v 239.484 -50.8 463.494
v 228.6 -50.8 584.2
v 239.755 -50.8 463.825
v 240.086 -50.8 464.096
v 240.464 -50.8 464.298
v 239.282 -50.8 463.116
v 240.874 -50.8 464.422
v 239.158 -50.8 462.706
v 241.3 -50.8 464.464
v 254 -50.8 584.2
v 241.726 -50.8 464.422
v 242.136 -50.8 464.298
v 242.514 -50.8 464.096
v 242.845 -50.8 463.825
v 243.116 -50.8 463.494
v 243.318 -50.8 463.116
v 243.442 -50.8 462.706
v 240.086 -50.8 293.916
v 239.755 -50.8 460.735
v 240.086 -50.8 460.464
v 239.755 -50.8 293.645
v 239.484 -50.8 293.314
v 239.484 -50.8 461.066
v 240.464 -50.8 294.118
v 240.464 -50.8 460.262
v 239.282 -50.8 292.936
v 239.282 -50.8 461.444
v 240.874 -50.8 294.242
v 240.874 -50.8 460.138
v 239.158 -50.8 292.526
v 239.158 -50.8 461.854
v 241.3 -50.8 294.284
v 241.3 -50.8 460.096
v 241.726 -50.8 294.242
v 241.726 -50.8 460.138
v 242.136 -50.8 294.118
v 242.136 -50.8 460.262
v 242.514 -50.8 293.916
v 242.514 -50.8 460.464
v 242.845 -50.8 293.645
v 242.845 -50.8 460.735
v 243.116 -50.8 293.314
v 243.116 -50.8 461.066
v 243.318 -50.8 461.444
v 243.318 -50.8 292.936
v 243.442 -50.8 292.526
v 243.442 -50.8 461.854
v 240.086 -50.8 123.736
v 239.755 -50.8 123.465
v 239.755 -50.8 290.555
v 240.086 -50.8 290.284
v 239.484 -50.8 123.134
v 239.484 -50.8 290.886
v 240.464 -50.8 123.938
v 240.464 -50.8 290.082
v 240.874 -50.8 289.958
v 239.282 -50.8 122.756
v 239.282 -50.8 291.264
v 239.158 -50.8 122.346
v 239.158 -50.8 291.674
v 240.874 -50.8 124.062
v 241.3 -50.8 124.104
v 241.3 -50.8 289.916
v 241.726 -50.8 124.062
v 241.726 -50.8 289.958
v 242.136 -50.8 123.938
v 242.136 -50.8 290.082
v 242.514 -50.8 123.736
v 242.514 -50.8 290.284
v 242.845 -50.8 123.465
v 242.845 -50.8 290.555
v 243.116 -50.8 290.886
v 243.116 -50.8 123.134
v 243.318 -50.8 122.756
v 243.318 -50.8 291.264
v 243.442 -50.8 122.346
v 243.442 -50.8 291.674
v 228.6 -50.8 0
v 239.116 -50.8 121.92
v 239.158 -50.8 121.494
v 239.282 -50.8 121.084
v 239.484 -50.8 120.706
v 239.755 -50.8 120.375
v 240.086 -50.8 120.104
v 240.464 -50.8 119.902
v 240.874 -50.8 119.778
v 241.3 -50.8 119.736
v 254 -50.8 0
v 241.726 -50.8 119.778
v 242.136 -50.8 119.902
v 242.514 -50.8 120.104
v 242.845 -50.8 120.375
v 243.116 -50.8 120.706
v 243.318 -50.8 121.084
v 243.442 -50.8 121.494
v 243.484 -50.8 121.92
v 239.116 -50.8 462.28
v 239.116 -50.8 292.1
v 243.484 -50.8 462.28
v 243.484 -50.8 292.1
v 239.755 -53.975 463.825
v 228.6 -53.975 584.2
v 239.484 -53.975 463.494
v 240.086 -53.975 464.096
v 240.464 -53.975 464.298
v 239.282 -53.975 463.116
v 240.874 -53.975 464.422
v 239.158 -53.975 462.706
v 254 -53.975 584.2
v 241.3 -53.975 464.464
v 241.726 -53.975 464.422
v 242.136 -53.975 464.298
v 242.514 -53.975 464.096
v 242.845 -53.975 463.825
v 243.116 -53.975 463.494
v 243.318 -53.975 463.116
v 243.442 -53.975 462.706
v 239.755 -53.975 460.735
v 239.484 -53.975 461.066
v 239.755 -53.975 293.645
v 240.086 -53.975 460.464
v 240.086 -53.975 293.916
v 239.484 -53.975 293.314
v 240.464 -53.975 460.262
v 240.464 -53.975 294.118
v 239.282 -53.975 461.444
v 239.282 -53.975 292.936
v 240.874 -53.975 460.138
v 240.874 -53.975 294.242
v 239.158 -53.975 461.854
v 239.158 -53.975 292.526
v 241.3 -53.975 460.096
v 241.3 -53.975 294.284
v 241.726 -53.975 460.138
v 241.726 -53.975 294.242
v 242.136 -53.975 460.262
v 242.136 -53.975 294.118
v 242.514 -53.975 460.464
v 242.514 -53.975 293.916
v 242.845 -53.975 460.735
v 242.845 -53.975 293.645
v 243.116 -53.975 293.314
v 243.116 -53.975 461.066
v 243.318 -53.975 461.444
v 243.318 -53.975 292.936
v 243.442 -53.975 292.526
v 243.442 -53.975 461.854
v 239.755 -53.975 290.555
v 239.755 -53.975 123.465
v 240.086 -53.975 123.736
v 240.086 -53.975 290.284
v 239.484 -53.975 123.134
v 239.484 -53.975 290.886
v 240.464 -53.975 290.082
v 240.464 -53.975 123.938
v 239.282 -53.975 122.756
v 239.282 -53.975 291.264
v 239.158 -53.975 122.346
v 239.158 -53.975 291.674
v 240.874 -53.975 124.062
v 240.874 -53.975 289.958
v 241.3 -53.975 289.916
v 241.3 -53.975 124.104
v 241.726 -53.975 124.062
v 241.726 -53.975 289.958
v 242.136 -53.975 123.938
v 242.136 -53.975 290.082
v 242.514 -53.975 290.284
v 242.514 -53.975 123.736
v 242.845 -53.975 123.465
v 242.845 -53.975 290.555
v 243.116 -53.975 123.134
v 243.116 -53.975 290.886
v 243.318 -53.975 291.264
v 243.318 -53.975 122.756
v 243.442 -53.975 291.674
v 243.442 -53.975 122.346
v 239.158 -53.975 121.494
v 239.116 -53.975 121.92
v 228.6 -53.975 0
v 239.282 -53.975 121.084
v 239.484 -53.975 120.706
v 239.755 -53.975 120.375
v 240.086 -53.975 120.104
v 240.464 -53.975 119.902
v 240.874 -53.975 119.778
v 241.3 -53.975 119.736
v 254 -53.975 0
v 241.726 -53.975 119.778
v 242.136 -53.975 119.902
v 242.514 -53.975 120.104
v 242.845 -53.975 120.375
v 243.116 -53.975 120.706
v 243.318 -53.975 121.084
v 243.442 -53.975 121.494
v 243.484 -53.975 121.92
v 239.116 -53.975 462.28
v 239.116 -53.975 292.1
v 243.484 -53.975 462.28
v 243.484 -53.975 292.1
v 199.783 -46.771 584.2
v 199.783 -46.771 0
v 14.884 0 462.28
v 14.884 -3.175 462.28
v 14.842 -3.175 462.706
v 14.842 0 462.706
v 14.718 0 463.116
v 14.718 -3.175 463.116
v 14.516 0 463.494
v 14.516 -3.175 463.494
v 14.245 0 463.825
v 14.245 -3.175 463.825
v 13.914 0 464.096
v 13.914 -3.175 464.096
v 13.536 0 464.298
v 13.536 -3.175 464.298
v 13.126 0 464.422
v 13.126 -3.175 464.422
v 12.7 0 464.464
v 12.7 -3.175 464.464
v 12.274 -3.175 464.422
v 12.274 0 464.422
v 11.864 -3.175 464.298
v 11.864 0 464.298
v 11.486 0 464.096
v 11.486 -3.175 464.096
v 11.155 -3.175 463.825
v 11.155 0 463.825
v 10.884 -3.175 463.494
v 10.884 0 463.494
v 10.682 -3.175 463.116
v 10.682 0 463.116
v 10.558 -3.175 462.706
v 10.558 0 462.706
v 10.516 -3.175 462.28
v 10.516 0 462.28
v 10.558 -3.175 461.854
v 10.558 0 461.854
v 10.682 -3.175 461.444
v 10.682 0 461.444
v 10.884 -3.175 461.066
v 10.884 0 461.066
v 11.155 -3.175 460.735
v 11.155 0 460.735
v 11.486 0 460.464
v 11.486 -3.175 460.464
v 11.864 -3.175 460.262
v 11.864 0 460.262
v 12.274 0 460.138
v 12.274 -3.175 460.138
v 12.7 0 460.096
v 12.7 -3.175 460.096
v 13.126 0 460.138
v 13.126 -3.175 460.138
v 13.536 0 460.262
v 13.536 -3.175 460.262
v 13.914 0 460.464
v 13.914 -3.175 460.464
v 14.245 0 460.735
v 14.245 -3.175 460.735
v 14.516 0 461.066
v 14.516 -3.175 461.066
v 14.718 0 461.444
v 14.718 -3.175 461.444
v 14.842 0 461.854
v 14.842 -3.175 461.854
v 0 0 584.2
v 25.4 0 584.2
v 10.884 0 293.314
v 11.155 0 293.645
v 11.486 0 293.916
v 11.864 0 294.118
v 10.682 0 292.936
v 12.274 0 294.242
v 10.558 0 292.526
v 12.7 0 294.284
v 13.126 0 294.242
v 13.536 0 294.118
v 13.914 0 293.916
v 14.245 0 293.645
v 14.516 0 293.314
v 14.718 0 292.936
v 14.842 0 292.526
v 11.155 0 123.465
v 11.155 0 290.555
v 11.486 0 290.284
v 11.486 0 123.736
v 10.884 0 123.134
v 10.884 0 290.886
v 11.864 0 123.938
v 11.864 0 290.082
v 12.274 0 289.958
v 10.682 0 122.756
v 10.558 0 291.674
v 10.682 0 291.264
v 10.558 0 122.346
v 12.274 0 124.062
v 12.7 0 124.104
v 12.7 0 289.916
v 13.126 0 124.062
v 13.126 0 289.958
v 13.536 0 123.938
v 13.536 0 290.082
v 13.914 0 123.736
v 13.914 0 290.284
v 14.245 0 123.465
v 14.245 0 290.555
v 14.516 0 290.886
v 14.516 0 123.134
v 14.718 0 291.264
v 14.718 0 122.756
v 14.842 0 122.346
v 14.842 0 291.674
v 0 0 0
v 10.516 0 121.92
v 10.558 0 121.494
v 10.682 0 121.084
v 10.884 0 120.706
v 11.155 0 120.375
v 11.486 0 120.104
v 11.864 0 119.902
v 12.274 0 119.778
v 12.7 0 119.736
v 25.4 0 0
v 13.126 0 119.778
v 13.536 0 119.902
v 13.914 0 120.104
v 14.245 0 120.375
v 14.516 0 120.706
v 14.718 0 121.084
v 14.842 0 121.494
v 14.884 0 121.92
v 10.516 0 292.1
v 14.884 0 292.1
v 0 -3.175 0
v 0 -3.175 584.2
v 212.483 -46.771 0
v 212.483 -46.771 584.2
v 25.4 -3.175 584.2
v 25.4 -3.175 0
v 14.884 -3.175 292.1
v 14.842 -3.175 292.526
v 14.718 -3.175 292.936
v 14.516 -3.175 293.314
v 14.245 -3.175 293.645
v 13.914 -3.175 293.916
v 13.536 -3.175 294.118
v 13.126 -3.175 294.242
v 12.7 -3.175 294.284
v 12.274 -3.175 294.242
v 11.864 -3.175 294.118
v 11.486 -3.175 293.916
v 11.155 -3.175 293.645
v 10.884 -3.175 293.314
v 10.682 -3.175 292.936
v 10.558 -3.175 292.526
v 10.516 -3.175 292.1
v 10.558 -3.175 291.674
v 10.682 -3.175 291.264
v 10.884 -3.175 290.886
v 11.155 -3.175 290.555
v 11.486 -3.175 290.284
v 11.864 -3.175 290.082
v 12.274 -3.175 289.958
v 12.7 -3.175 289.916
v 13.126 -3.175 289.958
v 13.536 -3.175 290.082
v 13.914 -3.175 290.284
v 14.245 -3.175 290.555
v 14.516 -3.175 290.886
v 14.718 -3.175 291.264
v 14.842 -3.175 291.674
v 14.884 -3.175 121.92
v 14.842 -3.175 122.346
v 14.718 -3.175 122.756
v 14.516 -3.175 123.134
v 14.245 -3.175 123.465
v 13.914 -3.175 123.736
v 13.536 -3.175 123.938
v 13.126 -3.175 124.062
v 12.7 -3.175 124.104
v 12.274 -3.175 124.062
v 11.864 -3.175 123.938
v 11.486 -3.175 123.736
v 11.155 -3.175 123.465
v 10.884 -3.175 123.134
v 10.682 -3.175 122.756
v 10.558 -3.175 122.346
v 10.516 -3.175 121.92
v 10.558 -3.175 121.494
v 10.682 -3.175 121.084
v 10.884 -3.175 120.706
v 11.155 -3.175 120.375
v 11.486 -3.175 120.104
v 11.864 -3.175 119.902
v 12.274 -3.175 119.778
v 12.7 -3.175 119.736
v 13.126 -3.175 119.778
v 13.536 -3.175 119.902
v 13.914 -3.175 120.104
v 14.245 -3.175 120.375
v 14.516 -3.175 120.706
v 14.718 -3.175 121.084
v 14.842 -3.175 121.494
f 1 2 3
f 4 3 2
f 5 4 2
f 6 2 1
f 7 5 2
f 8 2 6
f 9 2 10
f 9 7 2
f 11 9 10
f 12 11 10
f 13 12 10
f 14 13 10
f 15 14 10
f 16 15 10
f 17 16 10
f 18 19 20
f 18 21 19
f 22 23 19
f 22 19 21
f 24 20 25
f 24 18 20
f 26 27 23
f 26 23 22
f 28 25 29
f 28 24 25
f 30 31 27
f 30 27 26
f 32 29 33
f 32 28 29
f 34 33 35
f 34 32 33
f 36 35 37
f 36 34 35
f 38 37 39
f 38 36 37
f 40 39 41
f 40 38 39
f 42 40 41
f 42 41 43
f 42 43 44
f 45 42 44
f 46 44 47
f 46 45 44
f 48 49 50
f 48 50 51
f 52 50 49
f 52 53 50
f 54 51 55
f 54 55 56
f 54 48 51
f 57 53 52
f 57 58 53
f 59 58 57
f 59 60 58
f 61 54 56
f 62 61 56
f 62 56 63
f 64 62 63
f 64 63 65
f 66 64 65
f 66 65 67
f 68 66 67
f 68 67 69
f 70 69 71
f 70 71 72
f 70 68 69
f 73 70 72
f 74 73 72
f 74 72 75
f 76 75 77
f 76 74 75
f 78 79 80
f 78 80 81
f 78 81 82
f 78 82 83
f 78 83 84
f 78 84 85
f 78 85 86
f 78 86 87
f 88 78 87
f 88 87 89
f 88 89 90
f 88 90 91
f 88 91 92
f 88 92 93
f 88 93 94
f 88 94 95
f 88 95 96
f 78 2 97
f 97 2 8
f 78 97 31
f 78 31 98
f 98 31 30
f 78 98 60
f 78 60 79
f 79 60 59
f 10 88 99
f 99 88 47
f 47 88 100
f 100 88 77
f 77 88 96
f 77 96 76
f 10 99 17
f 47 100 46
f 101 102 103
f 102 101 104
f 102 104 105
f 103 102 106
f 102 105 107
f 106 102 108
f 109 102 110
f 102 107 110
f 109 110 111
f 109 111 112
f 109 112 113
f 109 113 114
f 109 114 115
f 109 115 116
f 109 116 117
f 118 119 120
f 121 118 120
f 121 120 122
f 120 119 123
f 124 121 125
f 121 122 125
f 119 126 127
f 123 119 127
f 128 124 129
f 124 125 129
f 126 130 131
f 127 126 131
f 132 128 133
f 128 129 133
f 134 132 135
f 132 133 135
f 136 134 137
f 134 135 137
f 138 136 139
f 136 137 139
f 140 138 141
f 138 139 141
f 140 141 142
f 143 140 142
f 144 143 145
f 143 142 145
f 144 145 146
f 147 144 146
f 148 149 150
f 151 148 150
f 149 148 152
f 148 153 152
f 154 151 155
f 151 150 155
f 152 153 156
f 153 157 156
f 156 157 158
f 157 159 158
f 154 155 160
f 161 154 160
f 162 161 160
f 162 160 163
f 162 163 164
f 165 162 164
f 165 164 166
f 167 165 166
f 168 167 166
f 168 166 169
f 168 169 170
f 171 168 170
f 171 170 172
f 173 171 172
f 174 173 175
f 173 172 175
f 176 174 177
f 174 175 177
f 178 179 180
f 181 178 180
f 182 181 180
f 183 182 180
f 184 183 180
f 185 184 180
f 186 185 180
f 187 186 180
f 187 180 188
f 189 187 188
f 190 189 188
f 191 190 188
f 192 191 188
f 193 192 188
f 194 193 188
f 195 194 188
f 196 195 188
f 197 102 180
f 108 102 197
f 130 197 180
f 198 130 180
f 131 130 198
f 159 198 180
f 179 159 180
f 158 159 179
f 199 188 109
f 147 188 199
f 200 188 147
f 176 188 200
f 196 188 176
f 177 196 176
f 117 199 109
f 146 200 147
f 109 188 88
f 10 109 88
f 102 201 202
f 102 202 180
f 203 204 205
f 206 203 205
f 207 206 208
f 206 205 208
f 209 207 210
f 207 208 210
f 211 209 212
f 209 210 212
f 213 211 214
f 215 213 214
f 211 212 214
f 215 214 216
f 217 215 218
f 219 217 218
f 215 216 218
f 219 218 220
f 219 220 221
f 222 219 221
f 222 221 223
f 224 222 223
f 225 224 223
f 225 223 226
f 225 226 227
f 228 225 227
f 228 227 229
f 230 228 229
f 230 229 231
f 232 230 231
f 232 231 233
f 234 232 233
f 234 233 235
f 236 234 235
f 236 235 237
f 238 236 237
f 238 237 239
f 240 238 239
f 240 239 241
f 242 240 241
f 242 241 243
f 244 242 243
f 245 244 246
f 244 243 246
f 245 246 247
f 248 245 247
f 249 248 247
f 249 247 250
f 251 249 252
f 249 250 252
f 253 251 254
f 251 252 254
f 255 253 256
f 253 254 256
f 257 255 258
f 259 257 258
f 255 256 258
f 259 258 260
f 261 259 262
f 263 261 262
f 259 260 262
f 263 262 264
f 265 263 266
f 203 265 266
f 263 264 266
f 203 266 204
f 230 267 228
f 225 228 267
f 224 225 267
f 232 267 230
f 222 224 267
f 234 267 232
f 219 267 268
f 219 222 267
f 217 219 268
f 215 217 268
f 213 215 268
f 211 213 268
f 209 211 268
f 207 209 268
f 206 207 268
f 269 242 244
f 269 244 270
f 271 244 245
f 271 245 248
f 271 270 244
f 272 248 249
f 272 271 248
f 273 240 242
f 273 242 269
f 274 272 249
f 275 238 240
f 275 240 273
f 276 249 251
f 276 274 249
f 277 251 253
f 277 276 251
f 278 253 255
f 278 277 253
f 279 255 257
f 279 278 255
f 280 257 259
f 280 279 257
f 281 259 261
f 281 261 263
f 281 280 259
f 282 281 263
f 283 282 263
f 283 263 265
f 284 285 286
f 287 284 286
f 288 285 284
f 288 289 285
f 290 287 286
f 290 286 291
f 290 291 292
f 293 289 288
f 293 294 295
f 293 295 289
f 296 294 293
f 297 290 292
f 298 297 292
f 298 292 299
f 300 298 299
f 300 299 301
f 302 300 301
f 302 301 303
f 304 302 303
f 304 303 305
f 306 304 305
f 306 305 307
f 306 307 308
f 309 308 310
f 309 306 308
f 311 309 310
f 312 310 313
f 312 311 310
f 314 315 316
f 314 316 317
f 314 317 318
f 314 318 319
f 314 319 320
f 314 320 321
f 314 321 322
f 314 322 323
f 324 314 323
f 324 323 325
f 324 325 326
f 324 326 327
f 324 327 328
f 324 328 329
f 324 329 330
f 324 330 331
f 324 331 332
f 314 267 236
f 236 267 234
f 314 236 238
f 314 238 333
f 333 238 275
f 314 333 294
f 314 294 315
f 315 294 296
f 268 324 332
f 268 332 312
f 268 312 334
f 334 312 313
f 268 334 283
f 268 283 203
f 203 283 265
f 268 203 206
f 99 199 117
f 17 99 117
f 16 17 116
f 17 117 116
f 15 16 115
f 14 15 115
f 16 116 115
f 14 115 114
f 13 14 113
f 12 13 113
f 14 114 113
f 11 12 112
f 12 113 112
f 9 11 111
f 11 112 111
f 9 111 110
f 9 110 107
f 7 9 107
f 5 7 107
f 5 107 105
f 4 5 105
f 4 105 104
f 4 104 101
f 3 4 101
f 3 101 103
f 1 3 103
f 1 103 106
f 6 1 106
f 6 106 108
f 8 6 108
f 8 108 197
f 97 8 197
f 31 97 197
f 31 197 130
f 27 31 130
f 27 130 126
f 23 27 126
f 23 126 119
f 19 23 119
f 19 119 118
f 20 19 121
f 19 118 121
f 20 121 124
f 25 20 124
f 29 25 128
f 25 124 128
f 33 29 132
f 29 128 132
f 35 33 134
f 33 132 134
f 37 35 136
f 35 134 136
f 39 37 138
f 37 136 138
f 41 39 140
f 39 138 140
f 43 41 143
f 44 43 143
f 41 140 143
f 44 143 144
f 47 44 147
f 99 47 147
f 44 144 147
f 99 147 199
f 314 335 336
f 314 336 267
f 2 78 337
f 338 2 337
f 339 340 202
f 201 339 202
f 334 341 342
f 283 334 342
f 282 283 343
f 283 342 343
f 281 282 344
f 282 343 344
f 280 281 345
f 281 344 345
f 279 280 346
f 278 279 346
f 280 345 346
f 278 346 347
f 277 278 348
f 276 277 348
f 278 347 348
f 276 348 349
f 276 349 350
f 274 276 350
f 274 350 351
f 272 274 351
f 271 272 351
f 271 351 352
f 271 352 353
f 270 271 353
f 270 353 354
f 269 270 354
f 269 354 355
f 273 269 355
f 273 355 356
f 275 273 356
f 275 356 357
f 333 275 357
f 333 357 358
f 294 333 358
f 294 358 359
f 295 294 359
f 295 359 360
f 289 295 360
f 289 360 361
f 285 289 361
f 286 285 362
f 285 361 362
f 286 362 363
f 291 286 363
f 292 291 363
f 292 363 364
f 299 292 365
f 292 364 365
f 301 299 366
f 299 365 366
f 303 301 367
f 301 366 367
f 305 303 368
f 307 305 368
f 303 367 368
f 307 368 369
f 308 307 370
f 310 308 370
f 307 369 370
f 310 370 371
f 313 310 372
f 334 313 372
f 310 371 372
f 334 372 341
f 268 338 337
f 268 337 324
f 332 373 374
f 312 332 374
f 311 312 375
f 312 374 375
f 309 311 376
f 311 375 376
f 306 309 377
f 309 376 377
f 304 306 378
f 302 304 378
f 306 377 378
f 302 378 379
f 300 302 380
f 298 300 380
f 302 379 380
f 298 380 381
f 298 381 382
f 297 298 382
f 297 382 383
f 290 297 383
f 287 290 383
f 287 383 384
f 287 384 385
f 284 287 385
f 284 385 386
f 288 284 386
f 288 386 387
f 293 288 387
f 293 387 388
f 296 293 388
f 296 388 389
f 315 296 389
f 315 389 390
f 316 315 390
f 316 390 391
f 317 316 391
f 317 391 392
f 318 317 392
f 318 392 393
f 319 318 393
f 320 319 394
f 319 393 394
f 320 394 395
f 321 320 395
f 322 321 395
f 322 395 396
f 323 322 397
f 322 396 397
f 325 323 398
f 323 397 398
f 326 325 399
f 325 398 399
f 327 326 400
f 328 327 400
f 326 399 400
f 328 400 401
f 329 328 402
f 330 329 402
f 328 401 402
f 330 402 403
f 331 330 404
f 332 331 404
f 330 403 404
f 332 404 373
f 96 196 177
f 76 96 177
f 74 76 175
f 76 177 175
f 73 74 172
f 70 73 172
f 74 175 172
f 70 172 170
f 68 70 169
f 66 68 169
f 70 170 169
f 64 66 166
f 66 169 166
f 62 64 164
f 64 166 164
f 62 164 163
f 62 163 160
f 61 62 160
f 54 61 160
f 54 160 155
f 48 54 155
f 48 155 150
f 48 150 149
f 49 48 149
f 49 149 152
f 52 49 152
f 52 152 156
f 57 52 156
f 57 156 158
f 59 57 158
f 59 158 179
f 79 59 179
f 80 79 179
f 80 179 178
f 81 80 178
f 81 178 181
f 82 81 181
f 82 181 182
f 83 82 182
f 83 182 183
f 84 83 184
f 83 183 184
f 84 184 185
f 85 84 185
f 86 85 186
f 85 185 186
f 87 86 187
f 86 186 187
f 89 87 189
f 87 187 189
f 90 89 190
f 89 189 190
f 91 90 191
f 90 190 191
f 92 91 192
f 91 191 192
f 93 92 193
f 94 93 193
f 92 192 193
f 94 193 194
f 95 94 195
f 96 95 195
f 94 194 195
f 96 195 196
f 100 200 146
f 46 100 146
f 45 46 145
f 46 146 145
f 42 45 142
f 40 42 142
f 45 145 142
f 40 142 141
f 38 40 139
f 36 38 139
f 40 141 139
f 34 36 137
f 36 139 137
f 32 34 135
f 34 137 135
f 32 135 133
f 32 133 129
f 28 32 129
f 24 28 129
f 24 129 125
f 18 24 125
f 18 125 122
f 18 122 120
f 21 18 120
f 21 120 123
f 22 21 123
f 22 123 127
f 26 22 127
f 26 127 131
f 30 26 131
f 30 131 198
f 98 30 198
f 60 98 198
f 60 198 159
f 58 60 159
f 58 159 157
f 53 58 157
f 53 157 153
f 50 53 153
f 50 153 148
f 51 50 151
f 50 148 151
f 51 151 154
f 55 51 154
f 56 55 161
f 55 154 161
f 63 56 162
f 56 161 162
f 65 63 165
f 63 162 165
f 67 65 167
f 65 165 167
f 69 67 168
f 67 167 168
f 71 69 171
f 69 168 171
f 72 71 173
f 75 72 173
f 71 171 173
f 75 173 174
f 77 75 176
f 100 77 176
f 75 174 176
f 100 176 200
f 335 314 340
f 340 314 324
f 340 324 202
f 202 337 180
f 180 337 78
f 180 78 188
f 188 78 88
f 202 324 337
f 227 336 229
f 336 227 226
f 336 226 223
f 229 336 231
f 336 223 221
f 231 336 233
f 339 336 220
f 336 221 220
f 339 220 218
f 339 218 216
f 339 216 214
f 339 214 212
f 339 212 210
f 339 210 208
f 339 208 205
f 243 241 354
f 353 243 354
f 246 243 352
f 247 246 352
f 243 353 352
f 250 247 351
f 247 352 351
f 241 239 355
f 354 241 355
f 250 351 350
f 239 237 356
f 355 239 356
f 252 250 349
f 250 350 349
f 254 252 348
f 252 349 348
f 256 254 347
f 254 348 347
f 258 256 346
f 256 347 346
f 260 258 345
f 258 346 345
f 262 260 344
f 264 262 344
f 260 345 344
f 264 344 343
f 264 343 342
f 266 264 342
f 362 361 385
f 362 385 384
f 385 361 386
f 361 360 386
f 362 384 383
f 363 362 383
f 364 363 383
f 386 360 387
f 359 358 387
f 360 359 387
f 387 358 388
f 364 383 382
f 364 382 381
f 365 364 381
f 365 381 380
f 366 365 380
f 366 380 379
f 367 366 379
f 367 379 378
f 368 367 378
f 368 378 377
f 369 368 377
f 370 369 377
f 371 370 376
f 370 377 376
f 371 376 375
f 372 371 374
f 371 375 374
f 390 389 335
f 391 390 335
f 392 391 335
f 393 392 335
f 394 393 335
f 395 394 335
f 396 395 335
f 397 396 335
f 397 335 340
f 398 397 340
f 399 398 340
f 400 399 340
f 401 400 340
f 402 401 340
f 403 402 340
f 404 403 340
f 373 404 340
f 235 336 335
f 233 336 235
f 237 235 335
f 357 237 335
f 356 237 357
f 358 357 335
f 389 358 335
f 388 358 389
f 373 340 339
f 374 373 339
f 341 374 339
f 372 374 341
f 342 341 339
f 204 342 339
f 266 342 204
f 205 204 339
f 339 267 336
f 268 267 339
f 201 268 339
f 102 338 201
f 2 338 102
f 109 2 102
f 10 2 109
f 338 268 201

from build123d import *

# Parameters (mm, degrees)
F0_W     = 25.4
F0_H     = 3.175
F1_DEPTH = 584.2
F2_R     = 2.1844
F3_DEPTH = 25.4
F4_R     = 2.1844
F5_DEPTH = 25.4


with BuildPart() as f1:
    # F0 (on Top) → F1 (new body)
    with BuildSketch(Plane.XY):
        with Locations((12.7, -1.5875)):
            Rectangle(F0_W, F0_H)
        Polygon((207.4032145214, -45.5008036304), (25.4, 0), (25.4, -3.175), (194.7032145214, -45.5008036304), align=None)
        with Locations((241.3, -52.3875)):
            Rectangle(F0_W, F0_H)
        Polygon((228.6, -50.8), (212.4832145214, -46.7708036304), (199.7832145214, -46.7708036304), (228.6, -53.975), align=None)
        Polygon((212.4832145214, -46.7708036304), (207.4032145214, -45.5008036304), (194.7032145214, -45.5008036304), (199.7832145214, -46.7708036304), align=None)
    extrude(amount=F1_DEPTH)

    # F2 (on face) → F3 (cut)
    with BuildSketch(Plane.XZ.offset(3.175)):
        with Locations((12.7, 121.92)):
            Circle(F2_R)
        with Locations((12.7, 292.1)):
            Circle(F2_R)
        with Locations((12.7, 462.28)):
            Circle(F2_R)
    extrude(amount=-F3_DEPTH, mode=Mode.SUBTRACT)

    # F4 (on face) → F5 (cut)
    with BuildSketch(Plane.XZ.offset(53.975)):
        with Locations((241.3, 292.1)):
            Circle(F4_R)
        with Locations((241.3, 462.28)):
            Circle(F4_R)
        with Locations((241.3, 121.92)):
            Circle(F4_R)
    extrude(amount=-F5_DEPTH, mode=Mode.SUBTRACT)


solid = f1.part
